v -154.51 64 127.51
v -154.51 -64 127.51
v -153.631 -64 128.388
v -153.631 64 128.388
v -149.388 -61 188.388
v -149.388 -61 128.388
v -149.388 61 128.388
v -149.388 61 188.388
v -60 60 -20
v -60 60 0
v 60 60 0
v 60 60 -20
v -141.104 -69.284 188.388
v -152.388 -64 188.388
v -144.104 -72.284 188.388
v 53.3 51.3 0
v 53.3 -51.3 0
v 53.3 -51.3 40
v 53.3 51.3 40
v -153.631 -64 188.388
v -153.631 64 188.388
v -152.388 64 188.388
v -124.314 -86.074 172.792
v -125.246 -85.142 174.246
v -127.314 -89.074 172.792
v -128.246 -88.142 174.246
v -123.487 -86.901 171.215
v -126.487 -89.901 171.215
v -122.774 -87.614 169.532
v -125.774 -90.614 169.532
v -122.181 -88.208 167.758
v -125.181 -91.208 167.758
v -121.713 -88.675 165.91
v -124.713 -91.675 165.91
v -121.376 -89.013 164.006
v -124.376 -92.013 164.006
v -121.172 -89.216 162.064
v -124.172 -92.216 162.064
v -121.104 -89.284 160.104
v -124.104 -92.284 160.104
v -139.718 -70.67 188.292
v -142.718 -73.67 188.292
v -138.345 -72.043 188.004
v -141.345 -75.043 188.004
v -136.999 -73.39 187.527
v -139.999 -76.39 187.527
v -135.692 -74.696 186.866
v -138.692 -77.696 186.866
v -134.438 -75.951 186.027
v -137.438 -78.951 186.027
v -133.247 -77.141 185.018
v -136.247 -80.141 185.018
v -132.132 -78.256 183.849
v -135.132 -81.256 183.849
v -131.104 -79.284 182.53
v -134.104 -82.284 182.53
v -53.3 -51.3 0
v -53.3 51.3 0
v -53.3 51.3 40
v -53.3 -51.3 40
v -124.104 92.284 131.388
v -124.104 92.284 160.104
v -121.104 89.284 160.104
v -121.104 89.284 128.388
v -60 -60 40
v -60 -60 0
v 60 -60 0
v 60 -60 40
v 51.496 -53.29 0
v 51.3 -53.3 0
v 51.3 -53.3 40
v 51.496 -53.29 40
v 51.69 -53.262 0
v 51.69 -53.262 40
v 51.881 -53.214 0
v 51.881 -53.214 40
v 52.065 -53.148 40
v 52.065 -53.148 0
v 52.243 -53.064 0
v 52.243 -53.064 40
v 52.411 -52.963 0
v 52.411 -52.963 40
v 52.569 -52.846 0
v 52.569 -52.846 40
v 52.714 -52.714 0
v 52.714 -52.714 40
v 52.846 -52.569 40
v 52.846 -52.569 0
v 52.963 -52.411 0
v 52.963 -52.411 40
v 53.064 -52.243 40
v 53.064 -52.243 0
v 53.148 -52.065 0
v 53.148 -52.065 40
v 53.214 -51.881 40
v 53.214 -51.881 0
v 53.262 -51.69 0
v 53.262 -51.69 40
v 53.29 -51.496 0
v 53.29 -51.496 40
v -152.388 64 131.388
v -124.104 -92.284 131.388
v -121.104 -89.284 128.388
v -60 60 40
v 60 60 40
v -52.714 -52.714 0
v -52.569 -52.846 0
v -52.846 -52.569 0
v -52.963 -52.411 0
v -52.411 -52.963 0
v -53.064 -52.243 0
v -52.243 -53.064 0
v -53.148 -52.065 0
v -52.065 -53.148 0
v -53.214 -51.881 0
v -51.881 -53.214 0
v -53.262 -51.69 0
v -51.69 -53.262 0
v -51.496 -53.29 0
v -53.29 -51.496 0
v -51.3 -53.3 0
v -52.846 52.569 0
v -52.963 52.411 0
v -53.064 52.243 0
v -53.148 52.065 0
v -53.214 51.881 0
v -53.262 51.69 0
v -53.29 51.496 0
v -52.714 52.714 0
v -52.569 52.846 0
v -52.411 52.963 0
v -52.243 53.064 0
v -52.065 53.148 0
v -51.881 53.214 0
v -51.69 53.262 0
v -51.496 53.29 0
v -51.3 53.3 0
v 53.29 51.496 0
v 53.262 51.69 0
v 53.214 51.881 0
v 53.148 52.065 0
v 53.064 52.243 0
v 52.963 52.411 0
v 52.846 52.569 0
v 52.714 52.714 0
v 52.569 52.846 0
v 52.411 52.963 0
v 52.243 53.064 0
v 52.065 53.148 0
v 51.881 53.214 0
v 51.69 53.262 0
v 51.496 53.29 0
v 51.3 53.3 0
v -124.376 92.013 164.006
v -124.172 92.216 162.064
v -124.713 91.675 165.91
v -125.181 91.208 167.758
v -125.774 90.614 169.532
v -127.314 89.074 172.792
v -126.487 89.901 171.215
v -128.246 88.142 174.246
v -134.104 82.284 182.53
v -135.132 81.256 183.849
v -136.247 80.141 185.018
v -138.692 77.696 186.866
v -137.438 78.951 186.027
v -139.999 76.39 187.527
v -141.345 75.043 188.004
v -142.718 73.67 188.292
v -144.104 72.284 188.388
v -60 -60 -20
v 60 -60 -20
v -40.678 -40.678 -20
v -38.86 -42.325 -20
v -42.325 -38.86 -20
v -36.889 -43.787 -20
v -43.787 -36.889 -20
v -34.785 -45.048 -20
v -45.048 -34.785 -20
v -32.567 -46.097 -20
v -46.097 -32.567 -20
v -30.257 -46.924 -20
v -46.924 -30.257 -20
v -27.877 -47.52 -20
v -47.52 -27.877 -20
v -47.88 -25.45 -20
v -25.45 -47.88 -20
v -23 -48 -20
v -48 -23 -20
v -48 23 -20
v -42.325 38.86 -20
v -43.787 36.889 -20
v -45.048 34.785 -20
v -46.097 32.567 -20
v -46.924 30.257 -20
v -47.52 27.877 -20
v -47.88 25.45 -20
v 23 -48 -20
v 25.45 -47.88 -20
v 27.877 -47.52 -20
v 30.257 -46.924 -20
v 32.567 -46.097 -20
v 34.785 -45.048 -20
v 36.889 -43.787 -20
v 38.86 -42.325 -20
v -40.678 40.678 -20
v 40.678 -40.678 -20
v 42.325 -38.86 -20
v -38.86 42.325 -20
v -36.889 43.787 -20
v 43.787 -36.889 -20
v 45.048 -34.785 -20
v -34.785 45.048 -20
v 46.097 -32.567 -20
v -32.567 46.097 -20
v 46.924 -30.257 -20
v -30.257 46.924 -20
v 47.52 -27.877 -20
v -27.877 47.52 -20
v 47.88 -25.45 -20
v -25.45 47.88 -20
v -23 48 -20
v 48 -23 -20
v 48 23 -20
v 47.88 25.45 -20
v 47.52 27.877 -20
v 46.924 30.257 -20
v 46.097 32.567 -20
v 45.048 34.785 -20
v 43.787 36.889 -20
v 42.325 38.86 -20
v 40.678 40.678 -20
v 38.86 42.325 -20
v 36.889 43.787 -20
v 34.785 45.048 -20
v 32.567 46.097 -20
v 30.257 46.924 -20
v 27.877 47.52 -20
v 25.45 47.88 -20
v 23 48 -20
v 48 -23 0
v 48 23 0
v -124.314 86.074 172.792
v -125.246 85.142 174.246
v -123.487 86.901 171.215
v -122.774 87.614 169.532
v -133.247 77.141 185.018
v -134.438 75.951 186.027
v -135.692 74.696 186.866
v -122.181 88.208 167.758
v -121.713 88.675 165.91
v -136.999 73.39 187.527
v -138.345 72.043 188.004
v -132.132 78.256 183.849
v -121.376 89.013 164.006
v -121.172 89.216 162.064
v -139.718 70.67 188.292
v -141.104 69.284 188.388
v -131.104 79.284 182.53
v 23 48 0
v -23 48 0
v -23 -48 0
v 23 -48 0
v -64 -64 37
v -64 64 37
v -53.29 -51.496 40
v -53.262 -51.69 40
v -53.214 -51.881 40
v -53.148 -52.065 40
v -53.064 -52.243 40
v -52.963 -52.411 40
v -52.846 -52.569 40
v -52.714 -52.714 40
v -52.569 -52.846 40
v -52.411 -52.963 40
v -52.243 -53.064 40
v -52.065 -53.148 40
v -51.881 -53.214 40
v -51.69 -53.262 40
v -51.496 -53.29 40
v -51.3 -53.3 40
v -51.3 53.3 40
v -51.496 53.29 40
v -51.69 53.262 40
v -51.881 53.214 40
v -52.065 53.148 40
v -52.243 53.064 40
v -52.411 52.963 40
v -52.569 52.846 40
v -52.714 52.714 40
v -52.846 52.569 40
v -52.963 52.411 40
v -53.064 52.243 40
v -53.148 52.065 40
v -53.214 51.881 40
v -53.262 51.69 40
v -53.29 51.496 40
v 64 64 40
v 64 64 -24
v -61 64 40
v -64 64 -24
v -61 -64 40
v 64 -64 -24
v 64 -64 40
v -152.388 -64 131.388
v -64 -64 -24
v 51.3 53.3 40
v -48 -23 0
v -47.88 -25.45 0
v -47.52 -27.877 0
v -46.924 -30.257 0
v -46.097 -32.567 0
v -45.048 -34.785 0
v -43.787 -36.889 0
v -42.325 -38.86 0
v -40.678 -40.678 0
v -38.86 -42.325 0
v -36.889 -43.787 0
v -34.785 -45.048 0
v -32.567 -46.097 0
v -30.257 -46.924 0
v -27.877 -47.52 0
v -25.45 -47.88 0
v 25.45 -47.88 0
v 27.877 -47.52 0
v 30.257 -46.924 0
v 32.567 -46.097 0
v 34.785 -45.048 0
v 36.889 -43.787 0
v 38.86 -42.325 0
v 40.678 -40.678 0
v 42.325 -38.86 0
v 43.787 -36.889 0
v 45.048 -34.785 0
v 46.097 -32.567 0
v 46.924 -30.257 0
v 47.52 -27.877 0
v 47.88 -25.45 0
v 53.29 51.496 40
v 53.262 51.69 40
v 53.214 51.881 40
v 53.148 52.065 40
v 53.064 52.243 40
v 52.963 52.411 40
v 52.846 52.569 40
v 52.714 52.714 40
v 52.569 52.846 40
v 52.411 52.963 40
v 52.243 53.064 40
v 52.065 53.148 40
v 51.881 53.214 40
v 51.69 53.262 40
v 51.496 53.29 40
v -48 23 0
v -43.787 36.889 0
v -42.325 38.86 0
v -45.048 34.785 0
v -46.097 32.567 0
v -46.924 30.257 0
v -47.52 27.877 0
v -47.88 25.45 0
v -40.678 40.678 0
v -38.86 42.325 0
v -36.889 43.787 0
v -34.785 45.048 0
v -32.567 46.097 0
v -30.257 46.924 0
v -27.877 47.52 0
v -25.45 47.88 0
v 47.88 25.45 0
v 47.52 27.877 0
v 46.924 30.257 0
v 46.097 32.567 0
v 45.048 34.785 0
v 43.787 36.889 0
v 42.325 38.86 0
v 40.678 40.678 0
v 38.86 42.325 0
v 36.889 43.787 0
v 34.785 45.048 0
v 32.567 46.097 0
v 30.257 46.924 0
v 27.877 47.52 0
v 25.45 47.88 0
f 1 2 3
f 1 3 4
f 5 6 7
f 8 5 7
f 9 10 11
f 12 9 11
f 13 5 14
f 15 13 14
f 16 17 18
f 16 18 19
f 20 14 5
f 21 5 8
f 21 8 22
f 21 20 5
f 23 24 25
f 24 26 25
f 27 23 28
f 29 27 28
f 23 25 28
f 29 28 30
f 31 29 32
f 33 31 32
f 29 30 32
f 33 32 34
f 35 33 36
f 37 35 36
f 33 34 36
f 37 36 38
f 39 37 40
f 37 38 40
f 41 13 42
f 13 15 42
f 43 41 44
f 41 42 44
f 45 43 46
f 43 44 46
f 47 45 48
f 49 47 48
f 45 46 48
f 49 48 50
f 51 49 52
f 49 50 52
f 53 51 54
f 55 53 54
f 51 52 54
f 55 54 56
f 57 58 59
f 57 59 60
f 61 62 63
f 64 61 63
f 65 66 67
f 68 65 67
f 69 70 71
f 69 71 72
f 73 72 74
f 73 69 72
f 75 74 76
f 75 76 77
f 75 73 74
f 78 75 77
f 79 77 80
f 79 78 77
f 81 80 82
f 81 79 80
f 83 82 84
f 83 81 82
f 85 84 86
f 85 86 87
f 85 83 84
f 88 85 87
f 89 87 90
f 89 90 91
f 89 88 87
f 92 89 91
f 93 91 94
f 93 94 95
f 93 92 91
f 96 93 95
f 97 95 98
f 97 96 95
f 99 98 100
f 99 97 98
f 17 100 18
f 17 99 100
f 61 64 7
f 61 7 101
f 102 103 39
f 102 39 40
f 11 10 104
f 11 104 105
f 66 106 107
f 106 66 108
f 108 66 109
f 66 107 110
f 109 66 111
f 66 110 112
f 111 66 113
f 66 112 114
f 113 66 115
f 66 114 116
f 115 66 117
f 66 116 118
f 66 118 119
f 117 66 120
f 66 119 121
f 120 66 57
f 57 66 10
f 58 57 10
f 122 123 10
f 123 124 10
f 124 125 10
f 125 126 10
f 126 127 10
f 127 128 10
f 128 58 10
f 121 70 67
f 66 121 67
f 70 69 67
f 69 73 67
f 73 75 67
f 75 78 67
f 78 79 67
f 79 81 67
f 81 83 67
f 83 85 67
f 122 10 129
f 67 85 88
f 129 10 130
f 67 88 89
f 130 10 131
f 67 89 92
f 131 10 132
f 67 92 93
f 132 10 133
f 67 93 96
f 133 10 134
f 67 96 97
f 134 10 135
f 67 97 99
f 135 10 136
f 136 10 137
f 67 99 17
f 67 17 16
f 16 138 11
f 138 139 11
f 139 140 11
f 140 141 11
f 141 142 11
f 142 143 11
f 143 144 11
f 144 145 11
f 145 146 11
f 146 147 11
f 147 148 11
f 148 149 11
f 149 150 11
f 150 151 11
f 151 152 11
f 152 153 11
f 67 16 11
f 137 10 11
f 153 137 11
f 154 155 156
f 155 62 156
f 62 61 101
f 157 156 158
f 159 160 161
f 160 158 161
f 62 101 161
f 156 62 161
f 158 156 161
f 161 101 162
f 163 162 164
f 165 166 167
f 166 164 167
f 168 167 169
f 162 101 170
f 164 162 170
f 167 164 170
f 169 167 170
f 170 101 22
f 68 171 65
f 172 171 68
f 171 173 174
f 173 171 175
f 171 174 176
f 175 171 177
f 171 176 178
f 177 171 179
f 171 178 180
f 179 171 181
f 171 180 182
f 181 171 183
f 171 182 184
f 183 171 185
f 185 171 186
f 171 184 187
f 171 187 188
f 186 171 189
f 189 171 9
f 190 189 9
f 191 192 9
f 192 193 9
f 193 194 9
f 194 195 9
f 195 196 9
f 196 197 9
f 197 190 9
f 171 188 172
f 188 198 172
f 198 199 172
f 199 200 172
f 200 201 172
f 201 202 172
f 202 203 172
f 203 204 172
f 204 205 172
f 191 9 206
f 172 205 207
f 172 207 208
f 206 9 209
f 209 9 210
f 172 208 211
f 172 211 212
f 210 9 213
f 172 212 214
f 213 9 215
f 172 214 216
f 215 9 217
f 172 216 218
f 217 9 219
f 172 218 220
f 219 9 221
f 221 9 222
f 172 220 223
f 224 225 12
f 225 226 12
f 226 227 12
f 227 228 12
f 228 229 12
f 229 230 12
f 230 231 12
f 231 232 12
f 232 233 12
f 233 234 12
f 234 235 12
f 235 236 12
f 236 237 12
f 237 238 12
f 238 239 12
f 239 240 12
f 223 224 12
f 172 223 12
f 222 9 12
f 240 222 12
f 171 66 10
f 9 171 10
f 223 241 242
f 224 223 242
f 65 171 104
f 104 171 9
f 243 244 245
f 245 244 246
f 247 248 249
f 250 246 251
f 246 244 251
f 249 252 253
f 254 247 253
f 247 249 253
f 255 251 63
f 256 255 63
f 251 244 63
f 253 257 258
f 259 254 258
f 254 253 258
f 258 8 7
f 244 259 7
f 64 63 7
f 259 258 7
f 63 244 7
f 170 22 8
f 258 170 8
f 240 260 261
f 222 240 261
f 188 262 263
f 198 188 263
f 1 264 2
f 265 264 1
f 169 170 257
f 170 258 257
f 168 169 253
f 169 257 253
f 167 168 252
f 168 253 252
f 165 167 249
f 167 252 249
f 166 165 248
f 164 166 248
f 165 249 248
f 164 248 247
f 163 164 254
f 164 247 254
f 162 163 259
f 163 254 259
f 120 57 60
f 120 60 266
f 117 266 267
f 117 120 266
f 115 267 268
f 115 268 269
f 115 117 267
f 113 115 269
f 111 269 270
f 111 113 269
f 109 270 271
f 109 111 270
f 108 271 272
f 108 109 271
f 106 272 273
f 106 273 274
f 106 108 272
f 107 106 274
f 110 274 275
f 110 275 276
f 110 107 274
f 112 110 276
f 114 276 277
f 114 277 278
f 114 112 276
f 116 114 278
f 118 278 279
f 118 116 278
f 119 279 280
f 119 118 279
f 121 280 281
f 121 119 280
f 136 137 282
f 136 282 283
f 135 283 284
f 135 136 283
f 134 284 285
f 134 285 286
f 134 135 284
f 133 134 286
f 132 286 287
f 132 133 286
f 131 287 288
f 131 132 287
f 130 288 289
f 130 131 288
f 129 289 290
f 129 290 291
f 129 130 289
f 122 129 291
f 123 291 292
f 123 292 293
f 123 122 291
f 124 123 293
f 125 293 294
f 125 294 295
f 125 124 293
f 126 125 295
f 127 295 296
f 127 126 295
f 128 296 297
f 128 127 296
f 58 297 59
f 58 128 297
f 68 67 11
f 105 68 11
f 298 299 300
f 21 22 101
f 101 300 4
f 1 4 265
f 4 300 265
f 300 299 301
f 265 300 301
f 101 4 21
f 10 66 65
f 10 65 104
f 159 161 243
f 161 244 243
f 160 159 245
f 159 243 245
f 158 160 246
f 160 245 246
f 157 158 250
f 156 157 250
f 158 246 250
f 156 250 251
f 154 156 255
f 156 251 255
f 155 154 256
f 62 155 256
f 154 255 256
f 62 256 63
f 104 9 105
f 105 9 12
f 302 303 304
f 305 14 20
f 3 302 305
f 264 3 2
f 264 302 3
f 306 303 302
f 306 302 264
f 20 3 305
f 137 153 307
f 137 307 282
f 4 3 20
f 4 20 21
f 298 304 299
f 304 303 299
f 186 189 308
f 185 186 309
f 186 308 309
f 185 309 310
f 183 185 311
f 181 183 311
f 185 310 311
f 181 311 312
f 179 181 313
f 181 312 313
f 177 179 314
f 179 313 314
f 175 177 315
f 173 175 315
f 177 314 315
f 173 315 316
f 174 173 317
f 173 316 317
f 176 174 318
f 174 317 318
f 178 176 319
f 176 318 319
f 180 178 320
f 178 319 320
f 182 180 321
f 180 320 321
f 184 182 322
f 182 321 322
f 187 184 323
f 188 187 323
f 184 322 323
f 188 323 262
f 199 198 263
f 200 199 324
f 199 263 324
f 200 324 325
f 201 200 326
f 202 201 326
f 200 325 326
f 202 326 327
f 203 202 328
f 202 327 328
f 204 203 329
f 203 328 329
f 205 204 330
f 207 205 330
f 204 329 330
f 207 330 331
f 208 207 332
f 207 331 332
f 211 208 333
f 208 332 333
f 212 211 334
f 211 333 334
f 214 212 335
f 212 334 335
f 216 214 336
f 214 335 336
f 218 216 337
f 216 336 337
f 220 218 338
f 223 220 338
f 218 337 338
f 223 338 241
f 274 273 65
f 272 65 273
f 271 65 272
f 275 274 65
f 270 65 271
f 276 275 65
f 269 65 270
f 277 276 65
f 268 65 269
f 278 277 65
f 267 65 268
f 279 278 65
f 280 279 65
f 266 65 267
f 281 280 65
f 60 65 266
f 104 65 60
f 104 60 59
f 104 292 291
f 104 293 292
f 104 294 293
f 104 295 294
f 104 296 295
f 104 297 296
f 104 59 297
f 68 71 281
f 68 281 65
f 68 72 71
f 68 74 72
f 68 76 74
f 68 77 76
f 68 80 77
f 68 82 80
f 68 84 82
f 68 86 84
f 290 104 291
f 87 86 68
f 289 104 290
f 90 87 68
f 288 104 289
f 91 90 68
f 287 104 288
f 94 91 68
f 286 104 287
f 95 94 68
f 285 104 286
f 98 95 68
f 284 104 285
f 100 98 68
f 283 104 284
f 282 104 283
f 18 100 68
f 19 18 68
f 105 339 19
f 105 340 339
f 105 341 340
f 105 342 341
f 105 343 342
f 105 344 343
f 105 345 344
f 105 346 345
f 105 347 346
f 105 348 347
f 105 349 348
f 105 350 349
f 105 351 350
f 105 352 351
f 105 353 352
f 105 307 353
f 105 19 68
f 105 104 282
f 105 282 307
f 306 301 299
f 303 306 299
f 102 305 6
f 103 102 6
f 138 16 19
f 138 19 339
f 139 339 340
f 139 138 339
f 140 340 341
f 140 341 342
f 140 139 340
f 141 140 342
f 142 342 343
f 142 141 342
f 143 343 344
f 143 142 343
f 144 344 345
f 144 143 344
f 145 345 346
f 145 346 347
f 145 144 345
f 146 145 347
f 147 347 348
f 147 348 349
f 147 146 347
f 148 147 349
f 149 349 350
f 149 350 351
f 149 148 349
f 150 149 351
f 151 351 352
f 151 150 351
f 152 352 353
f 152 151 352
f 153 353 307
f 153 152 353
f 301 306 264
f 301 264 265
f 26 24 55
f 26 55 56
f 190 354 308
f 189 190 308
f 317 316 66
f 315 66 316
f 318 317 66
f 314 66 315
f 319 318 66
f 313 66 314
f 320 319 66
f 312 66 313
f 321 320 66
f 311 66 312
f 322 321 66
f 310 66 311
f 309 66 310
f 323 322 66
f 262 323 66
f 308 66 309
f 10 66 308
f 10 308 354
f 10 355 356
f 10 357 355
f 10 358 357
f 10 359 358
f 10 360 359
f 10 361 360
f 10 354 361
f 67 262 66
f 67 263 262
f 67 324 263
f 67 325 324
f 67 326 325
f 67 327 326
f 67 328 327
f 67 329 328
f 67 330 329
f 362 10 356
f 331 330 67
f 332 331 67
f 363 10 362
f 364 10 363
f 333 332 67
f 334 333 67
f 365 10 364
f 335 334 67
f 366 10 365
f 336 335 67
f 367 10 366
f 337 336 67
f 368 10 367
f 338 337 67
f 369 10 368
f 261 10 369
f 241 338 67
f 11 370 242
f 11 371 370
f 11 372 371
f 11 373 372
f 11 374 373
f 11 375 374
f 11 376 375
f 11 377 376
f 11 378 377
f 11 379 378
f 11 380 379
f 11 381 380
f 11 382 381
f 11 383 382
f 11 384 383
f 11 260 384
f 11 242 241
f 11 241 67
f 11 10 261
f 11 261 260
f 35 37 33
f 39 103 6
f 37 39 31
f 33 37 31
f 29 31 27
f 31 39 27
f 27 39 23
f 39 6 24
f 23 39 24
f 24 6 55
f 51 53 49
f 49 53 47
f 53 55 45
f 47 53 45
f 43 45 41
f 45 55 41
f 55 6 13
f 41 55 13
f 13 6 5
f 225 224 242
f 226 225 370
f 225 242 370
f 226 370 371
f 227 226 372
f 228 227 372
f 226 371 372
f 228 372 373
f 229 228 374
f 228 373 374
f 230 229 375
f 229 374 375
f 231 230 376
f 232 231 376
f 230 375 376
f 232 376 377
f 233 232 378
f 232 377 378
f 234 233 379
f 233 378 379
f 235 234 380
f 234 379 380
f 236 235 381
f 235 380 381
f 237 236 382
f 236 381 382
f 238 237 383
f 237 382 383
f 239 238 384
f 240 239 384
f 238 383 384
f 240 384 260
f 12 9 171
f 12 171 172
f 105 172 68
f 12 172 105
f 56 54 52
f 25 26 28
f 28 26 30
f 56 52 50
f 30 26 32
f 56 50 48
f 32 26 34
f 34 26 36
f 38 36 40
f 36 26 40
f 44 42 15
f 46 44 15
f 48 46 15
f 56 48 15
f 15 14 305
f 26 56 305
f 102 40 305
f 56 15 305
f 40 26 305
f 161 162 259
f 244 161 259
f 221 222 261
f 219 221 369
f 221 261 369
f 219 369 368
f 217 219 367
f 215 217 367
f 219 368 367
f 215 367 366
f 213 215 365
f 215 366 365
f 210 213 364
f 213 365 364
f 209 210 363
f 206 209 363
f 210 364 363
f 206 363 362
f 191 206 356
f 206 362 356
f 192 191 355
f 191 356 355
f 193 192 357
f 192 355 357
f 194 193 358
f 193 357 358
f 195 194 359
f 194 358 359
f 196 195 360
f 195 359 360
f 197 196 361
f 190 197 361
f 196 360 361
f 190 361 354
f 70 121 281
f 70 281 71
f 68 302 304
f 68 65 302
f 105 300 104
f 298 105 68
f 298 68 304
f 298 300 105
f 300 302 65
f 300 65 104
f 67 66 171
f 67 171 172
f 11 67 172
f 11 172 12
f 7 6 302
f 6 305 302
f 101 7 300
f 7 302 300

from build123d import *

# Parameters (mm, degrees)
SKETCH_W           = 120
SKETCH_H           = 120
PAD_DEPTH          = 40
SKETCH001_W        = 120
SKETCH001_H        = 120
PAD001_DEPTH       = 20
SKETCH002_W        = 128
SKETCH002_H        = 128
PAD002_DEPTH       = 4
SKETCH003_W        = 128
SKETCH003_H        = 128
SKETCH003_W_2      = 120
SKETCH003_H_2      = 120
PAD003_DEPTH       = 60
CHAMFER_SIZE       = 3
CHAMFER_FACE3_W    = 128
CHAMFER_FACE3_H    = 4.24264
PAD004_DEPTH       = 128
CHAMFER001_SIZE    = 3
CHAMFER001_FACE3_W = 128
CHAMFER001_FACE3_H = 4.24264
PAD005_DEPTH       = 60
CHAMFER002_SIZE    = 3
PAD006_DEPTH       = 40
PAD007_DEPTH       = 40
CHAMFER003_SIZE    = 20
FILLET_R           = 20


with BuildPart() as upper:
    # Sketch → Pad (new body)
    with BuildSketch(Plane.XY):
        Rectangle(SKETCH_W, SKETCH_H)
        with BuildLine():
            Line((-51.3, -53.3), (51.3, -53.3))
            ThreePointArc((51.3, -53.3), (52.714214, -52.714214), (53.3, -51.3))
            Line((53.3, -51.3), (53.3, 51.3))
            ThreePointArc((53.3, 51.3), (52.714214, 52.714214), (51.3, 53.3))
            Line((51.3, 53.3), (-51.3, 53.3))
            ThreePointArc((-51.3, 53.3), (-52.714214, 52.714214), (-53.3, 51.3))
            Line((-53.3, 51.3), (-53.3, -51.3))
            ThreePointArc((-53.3, -51.3), (-52.714214, -52.714214), (-51.3, -53.3))
        make_face(mode=Mode.SUBTRACT)
    extrude(amount=PAD_DEPTH)


with BuildPart() as lower:
    # Sketch001 → Pad001 (new body)
    with BuildSketch(Plane.XY):
        Rectangle(SKETCH001_W, SKETCH001_H)
        with BuildLine():
            Line((-23, -48), (23, -48))
            ThreePointArc((23, -48), (40.67767, -40.67767), (48, -23))
            Line((48, -23), (48, 23))
            ThreePointArc((48, 23), (40.67767, 40.67767), (23, 48))
            Line((23, 48), (-23, 48))
            ThreePointArc((-23, 48), (-40.67767, 40.67767), (-48, 23))
            Line((-48, 23), (-48, -23))
            ThreePointArc((-48, -23), (-40.67767, -40.67767), (-23, -48))
        make_face(mode=Mode.SUBTRACT)
    extrude(amount=-PAD001_DEPTH)


with BuildPart() as cardboard:
    # Sketch002 → Pad002 (new body)
    with BuildSketch(Plane.XY.offset(-20)):
        Rectangle(SKETCH002_W, SKETCH002_H)
    extrude(amount=-PAD002_DEPTH)

    # Sketch003 (on Face5 of Pad002) → Pad003 (join)
    with BuildSketch(Plane.XY.offset(-20)):
        Rectangle(SKETCH003_W, SKETCH003_H)
        Rectangle(SKETCH003_W_2, SKETCH003_H_2, mode=Mode.SUBTRACT)
    extrude(amount=PAD003_DEPTH)

    # Chamfer
    chamfer_edges = [cardboard.edges().sort_by_distance(p)[0] for p in [
        (-64, 0, 40),
    ]]
    chamfer(chamfer_edges, length=CHAMFER_SIZE)

    # Chamfer Face3 → Pad004 (add)
    with BuildSketch(Plane(origin=(-62.5, 0, 38.5), x_dir=(0, 1, 0), z_dir=(-0.707107, 0, 0.707107))):
        Rectangle(CHAMFER_FACE3_W, CHAMFER_FACE3_H)
    extrude(amount=PAD004_DEPTH)

    # Chamfer001
    chamfer001_edges = [cardboard.edges().sort_by_distance(p)[0] for p in [
        (-151.509668, 0, 130.509668),
    ]]
    chamfer(chamfer001_edges, length=CHAMFER001_SIZE)

    # Chamfer001 Face3 → Pad005 (add)
    with BuildSketch(Plane(origin=(-151.509668, 0, 128.388348), x_dir=(0, 1, 0), z_dir=(0, 0, 1))):
        Rectangle(CHAMFER001_FACE3_W, CHAMFER001_FACE3_H)
    extrude(amount=PAD005_DEPTH)

    # Chamfer002
    chamfer002_edges = [cardboard.edges().sort_by_distance(p)[0] for p in [
        (-149.388348, -64, 158.388348),
        (-149.388348, 64, 158.388348),
    ]]
    chamfer(chamfer002_edges, length=CHAMFER002_SIZE)

    # Chamfer002 Face4 → Pad006 (add)
    with BuildSketch(Plane(origin=(-150.875527, -62.487179, 159.131937), x_dir=(-0.707107, -0.707107, 0), z_dir=(0.707107, -0.707107, 0))):
        Polygon((2.139451, 27.74359), (-2.103189, 30.74359), (-2.103189, -29.25641), (2.139451, -29.25641), align=None)
    extrude(amount=PAD006_DEPTH)

    # Pad006 Face3 → Pad007 (add)
    with BuildSketch(Plane(origin=(-150.875527, 62.487179, 159.131937), x_dir=(0.707107, -0.707107, 0), z_dir=(0.707107, 0.707107, 0))):
        Polygon((2.103189, 30.74359), (-2.139451, 27.74359), (-2.139451, -29.25641), (2.103189, -29.25641), align=None)
    extrude(amount=PAD007_DEPTH)

    # Chamfer003
    chamfer003_edges = [cardboard.edges().sort_by_distance(p)[0] for p in [
        (-122.604076, -90.784271, 188.388348),
        (-122.604076, 90.784271, 188.388348),
    ]]
    chamfer(chamfer003_edges, length=CHAMFER003_SIZE)

    # Fillet
    fillet_edges = [cardboard.edges().sort_by_distance(p)[0] for p in [
        (-122.604076, -90.784271, 168.388348),
        (-136.746212, -76.642136, 188.388348),
        (-136.746212, 76.642136, 188.388348),
        (-122.604076, 90.784271, 168.388348),
    ]]
    fillet(fillet_edges, radius=FILLET_R)


solid = Compound([upper.part, lower.part, cardboard.part])
